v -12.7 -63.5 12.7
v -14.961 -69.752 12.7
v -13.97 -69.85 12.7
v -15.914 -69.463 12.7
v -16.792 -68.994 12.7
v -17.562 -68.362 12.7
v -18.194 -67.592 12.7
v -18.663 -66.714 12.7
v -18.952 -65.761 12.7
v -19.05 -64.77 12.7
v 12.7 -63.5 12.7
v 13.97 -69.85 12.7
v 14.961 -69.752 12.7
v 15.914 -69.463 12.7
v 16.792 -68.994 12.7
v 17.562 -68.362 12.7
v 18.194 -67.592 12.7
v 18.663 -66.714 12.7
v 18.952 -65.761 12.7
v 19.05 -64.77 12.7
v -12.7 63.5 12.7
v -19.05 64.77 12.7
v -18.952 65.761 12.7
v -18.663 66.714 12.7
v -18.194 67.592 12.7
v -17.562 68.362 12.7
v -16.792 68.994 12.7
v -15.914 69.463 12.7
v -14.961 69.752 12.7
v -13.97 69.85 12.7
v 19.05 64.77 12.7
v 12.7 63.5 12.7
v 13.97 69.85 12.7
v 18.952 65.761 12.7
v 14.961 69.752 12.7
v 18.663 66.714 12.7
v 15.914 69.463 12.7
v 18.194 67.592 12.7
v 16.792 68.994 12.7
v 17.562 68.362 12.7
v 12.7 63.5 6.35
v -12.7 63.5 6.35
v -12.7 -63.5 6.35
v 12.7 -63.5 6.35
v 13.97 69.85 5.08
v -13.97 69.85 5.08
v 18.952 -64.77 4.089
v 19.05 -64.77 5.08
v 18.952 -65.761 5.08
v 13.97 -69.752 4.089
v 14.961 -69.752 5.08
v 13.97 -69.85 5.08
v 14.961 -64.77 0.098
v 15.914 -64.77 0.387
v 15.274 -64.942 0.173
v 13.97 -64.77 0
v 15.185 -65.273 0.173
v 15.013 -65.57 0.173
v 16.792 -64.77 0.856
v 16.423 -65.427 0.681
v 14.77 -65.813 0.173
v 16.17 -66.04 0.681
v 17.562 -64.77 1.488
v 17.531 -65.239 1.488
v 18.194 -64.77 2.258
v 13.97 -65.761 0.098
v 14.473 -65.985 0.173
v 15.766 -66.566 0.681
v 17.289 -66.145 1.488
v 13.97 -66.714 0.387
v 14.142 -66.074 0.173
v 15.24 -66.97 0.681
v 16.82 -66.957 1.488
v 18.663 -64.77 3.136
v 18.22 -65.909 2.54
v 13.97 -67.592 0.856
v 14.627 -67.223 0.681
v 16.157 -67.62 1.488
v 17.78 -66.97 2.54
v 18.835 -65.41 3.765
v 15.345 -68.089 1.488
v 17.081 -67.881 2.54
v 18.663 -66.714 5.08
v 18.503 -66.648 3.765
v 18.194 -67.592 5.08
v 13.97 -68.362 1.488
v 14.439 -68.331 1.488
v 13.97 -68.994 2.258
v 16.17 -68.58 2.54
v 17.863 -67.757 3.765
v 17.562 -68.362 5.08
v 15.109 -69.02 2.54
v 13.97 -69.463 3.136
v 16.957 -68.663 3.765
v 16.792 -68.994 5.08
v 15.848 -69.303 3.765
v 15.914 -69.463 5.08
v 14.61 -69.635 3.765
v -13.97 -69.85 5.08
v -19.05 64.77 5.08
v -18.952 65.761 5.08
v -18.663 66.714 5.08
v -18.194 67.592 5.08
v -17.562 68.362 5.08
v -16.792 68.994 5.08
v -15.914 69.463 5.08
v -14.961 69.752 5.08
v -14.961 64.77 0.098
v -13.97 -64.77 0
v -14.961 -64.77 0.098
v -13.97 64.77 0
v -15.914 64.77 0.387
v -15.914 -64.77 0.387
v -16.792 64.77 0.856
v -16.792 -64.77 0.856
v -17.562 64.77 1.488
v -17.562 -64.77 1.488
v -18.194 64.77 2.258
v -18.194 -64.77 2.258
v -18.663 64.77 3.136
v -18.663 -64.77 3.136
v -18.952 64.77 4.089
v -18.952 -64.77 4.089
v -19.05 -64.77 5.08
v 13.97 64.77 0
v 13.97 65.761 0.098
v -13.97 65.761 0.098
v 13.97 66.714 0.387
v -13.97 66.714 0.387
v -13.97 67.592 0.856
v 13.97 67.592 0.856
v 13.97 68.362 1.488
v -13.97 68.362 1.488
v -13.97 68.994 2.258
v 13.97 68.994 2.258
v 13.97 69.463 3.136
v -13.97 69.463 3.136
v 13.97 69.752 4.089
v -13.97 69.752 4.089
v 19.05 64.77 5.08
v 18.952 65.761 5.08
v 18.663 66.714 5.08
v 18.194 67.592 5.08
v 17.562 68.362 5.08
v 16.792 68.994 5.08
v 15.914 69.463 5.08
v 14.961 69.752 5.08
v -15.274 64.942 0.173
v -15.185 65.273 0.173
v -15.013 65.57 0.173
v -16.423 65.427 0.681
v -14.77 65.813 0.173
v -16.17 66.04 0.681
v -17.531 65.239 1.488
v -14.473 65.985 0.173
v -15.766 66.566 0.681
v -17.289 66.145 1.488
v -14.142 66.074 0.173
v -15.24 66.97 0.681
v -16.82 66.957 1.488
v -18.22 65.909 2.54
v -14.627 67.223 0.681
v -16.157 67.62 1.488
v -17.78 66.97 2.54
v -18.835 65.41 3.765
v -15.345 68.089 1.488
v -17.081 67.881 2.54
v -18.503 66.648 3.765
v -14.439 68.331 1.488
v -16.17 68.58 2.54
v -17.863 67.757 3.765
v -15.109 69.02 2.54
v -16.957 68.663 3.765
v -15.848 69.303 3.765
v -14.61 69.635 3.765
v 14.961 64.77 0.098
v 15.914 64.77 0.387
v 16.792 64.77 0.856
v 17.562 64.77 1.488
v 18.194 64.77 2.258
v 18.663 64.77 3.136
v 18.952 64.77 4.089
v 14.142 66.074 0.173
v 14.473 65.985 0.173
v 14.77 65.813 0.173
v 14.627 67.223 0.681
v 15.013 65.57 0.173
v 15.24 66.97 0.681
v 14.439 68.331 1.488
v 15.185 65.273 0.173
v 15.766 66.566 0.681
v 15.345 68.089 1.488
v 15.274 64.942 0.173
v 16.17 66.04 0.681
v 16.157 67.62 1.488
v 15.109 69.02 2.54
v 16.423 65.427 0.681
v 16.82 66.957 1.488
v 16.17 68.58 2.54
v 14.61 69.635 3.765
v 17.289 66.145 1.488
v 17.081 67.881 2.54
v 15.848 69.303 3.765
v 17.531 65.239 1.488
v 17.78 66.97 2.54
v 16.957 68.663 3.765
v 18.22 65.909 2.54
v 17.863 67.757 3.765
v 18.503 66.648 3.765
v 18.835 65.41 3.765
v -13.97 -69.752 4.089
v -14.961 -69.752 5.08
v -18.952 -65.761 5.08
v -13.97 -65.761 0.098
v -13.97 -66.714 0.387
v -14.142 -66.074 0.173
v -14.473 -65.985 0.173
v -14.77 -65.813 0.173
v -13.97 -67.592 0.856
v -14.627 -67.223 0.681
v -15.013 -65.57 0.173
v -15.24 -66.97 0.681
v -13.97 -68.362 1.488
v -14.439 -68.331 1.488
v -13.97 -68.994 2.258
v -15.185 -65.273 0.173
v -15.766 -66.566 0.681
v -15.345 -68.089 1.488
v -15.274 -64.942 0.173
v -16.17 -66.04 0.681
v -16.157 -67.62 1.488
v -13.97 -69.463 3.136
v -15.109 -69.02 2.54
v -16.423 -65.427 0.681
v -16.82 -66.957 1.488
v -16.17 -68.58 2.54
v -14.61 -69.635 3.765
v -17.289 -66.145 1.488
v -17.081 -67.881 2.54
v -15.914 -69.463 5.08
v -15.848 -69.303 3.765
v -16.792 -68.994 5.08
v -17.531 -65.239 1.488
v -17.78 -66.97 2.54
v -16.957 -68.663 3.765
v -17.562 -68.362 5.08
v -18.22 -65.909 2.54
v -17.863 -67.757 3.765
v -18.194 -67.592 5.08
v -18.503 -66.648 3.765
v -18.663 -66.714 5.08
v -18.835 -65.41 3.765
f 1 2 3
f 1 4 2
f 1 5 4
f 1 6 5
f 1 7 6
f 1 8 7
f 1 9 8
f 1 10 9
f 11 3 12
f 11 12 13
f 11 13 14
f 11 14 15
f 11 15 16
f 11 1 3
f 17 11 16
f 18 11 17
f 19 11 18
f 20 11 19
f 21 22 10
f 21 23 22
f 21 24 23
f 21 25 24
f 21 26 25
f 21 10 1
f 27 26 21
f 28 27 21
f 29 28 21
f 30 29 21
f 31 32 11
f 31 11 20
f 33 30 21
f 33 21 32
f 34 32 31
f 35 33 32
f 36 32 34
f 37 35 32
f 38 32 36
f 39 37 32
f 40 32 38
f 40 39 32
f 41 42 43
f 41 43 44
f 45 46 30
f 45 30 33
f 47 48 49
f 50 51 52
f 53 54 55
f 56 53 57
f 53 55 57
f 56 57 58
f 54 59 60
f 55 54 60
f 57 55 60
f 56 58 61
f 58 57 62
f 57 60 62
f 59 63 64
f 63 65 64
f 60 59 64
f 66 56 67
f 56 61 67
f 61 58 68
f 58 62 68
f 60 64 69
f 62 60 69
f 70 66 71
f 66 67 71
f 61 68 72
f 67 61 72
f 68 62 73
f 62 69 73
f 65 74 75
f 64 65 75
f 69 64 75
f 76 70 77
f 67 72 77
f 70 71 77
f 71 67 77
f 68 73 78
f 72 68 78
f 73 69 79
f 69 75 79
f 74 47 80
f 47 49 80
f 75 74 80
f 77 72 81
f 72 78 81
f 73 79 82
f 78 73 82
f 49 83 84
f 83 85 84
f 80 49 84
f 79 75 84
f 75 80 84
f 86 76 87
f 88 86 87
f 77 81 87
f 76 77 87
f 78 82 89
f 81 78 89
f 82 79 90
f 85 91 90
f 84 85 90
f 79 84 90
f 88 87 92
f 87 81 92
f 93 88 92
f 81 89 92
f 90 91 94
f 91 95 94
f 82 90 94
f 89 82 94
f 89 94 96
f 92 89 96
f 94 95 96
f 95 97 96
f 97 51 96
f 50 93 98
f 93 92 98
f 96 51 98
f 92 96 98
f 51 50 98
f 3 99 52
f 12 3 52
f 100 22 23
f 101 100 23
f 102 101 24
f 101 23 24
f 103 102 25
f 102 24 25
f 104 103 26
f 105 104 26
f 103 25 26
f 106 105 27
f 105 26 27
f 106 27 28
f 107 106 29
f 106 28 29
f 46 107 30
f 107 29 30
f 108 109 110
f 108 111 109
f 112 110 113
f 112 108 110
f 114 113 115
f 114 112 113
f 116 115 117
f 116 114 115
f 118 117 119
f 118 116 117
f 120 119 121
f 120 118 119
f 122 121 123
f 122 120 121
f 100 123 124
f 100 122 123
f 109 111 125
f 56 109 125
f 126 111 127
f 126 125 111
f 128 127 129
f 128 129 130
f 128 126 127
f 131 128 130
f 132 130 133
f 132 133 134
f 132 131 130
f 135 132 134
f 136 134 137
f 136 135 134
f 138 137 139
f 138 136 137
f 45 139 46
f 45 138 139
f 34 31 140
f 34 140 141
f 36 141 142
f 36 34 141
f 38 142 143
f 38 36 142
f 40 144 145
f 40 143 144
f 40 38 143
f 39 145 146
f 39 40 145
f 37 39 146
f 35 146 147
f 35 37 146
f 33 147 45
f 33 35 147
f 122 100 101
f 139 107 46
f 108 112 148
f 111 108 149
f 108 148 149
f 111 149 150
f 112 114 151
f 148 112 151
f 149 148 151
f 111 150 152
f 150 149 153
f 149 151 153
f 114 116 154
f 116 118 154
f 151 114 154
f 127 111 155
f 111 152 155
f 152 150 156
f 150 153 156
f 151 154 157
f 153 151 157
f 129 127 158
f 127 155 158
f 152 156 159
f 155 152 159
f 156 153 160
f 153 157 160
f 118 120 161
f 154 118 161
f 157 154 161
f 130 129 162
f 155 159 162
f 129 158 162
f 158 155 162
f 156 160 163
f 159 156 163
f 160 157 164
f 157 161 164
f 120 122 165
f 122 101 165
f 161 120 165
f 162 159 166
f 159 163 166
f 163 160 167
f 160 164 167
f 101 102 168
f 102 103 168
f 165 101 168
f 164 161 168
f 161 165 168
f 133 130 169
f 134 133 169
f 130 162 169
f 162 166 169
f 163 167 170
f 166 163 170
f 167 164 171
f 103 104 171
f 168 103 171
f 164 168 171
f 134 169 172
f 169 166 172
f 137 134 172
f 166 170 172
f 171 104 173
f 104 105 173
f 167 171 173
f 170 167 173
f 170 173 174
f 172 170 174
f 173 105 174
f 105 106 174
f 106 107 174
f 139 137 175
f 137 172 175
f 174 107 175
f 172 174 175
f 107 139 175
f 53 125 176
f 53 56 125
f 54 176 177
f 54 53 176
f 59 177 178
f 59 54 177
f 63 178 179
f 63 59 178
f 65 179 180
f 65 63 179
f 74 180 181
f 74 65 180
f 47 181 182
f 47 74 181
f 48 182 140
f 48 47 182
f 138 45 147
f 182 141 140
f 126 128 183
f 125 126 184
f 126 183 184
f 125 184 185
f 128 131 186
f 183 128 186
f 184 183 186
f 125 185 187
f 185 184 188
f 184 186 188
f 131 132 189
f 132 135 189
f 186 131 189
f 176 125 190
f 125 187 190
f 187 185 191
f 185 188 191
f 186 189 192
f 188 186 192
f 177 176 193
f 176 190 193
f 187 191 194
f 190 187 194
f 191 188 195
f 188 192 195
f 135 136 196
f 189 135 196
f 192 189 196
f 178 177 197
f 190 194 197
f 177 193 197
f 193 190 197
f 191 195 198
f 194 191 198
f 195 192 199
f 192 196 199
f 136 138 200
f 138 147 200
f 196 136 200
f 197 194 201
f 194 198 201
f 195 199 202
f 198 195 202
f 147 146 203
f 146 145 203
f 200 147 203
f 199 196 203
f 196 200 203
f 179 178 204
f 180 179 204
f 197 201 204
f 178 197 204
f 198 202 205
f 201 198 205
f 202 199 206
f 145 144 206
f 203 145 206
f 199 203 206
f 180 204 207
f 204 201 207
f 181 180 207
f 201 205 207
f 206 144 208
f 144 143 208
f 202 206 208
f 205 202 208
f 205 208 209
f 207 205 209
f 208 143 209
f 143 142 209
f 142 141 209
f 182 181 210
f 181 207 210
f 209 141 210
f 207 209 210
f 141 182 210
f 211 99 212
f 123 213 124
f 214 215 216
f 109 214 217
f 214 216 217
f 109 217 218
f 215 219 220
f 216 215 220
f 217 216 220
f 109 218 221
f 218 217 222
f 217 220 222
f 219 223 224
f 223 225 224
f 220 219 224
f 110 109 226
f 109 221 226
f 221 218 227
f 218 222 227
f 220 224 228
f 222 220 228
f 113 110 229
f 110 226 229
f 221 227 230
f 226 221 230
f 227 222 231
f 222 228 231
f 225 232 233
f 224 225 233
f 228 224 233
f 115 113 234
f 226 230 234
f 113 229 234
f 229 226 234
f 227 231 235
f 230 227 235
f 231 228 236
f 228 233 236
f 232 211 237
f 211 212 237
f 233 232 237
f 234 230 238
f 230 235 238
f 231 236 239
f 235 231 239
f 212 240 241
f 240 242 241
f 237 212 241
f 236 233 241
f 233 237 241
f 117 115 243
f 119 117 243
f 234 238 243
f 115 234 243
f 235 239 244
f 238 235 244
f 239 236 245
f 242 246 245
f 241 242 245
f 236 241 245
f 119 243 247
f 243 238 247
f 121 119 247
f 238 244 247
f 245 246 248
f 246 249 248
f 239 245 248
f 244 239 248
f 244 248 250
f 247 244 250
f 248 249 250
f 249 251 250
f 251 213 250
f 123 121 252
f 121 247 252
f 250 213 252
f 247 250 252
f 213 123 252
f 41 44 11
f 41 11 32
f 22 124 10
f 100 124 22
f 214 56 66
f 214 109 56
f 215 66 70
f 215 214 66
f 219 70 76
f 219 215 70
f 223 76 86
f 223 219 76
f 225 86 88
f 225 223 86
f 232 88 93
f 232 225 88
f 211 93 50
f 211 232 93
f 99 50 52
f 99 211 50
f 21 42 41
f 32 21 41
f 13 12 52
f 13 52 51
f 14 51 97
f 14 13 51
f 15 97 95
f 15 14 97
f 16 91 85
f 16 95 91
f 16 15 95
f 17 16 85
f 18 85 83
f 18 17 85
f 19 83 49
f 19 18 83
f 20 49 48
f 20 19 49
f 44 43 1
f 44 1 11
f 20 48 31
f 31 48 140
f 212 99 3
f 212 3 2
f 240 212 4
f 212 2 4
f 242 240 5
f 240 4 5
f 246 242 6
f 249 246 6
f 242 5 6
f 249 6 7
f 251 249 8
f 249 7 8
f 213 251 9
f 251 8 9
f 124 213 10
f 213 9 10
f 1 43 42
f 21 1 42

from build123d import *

# Parameters (mm, degrees)
F0_W     = 38.1
F0_H     = 139.7
F0_W_2   = 25.4
F0_H_2   = 127
F1_DEPTH = 12.7
F2_DEPTH = 6.35
F3_F1_R  = 5.08
F3_F2_R  = 5.08
F3_F3_R  = 5.08
F3_F4_R  = 5.08
F3_F5_R  = 5.08


# Not quite as in the source:
# - a feature of the source that left no trace in its solid (it failed there, or was rolled back) is left out


with BuildPart() as f1:
    # F0 (on Top) → F1 (new body)
    with BuildSketch(Plane.XY):
        Rectangle(F0_W, F0_H)
        Rectangle(F0_W_2, F0_H_2, mode=Mode.SUBTRACT)
    extrude(amount=F1_DEPTH)

    # F0 (on Top) → F2 (join)
    with BuildSketch(Plane.XY):
        Rectangle(F0_W_2, F0_H_2)
    extrude(amount=F2_DEPTH)

    # F3: fillet of radius 5.08 on 6 edges, made by hand

    # F3_f1
    f3_f1_edges = [f1.edges().sort_by_distance(p)[0] for p in [
        (19.05, -69.85, 6.35),
    ]]
    fillet(f3_f1_edges, radius=F3_F1_R)

    # F3_f2
    f3_f2_edges = [f1.edges().sort_by_distance(p)[0] for p in [
        (19.05, 69.85, 6.35),
    ]]
    fillet(f3_f2_edges, radius=F3_F2_R)

    # F3_f3
    f3_f3_edges = [f1.edges().sort_by_distance(p)[0] for p in [
        (-19.05, -69.85, 6.35),
    ]]
    fillet(f3_f3_edges, radius=F3_F3_R)

    # F3_f4
    f3_f4_edges = [f1.edges().sort_by_distance(p)[0] for p in [
        (-19.05, 69.85, 6.35),
    ]]
    fillet(f3_f4_edges, radius=F3_F4_R)

    # F3_f5
    f3_f5_edges = [f1.edges().sort_by_distance(p)[0] for p in [
        (0, 69.85, 0),
    ]]
    fillet(f3_f5_edges, radius=F3_F5_R)


solid = f1.part
